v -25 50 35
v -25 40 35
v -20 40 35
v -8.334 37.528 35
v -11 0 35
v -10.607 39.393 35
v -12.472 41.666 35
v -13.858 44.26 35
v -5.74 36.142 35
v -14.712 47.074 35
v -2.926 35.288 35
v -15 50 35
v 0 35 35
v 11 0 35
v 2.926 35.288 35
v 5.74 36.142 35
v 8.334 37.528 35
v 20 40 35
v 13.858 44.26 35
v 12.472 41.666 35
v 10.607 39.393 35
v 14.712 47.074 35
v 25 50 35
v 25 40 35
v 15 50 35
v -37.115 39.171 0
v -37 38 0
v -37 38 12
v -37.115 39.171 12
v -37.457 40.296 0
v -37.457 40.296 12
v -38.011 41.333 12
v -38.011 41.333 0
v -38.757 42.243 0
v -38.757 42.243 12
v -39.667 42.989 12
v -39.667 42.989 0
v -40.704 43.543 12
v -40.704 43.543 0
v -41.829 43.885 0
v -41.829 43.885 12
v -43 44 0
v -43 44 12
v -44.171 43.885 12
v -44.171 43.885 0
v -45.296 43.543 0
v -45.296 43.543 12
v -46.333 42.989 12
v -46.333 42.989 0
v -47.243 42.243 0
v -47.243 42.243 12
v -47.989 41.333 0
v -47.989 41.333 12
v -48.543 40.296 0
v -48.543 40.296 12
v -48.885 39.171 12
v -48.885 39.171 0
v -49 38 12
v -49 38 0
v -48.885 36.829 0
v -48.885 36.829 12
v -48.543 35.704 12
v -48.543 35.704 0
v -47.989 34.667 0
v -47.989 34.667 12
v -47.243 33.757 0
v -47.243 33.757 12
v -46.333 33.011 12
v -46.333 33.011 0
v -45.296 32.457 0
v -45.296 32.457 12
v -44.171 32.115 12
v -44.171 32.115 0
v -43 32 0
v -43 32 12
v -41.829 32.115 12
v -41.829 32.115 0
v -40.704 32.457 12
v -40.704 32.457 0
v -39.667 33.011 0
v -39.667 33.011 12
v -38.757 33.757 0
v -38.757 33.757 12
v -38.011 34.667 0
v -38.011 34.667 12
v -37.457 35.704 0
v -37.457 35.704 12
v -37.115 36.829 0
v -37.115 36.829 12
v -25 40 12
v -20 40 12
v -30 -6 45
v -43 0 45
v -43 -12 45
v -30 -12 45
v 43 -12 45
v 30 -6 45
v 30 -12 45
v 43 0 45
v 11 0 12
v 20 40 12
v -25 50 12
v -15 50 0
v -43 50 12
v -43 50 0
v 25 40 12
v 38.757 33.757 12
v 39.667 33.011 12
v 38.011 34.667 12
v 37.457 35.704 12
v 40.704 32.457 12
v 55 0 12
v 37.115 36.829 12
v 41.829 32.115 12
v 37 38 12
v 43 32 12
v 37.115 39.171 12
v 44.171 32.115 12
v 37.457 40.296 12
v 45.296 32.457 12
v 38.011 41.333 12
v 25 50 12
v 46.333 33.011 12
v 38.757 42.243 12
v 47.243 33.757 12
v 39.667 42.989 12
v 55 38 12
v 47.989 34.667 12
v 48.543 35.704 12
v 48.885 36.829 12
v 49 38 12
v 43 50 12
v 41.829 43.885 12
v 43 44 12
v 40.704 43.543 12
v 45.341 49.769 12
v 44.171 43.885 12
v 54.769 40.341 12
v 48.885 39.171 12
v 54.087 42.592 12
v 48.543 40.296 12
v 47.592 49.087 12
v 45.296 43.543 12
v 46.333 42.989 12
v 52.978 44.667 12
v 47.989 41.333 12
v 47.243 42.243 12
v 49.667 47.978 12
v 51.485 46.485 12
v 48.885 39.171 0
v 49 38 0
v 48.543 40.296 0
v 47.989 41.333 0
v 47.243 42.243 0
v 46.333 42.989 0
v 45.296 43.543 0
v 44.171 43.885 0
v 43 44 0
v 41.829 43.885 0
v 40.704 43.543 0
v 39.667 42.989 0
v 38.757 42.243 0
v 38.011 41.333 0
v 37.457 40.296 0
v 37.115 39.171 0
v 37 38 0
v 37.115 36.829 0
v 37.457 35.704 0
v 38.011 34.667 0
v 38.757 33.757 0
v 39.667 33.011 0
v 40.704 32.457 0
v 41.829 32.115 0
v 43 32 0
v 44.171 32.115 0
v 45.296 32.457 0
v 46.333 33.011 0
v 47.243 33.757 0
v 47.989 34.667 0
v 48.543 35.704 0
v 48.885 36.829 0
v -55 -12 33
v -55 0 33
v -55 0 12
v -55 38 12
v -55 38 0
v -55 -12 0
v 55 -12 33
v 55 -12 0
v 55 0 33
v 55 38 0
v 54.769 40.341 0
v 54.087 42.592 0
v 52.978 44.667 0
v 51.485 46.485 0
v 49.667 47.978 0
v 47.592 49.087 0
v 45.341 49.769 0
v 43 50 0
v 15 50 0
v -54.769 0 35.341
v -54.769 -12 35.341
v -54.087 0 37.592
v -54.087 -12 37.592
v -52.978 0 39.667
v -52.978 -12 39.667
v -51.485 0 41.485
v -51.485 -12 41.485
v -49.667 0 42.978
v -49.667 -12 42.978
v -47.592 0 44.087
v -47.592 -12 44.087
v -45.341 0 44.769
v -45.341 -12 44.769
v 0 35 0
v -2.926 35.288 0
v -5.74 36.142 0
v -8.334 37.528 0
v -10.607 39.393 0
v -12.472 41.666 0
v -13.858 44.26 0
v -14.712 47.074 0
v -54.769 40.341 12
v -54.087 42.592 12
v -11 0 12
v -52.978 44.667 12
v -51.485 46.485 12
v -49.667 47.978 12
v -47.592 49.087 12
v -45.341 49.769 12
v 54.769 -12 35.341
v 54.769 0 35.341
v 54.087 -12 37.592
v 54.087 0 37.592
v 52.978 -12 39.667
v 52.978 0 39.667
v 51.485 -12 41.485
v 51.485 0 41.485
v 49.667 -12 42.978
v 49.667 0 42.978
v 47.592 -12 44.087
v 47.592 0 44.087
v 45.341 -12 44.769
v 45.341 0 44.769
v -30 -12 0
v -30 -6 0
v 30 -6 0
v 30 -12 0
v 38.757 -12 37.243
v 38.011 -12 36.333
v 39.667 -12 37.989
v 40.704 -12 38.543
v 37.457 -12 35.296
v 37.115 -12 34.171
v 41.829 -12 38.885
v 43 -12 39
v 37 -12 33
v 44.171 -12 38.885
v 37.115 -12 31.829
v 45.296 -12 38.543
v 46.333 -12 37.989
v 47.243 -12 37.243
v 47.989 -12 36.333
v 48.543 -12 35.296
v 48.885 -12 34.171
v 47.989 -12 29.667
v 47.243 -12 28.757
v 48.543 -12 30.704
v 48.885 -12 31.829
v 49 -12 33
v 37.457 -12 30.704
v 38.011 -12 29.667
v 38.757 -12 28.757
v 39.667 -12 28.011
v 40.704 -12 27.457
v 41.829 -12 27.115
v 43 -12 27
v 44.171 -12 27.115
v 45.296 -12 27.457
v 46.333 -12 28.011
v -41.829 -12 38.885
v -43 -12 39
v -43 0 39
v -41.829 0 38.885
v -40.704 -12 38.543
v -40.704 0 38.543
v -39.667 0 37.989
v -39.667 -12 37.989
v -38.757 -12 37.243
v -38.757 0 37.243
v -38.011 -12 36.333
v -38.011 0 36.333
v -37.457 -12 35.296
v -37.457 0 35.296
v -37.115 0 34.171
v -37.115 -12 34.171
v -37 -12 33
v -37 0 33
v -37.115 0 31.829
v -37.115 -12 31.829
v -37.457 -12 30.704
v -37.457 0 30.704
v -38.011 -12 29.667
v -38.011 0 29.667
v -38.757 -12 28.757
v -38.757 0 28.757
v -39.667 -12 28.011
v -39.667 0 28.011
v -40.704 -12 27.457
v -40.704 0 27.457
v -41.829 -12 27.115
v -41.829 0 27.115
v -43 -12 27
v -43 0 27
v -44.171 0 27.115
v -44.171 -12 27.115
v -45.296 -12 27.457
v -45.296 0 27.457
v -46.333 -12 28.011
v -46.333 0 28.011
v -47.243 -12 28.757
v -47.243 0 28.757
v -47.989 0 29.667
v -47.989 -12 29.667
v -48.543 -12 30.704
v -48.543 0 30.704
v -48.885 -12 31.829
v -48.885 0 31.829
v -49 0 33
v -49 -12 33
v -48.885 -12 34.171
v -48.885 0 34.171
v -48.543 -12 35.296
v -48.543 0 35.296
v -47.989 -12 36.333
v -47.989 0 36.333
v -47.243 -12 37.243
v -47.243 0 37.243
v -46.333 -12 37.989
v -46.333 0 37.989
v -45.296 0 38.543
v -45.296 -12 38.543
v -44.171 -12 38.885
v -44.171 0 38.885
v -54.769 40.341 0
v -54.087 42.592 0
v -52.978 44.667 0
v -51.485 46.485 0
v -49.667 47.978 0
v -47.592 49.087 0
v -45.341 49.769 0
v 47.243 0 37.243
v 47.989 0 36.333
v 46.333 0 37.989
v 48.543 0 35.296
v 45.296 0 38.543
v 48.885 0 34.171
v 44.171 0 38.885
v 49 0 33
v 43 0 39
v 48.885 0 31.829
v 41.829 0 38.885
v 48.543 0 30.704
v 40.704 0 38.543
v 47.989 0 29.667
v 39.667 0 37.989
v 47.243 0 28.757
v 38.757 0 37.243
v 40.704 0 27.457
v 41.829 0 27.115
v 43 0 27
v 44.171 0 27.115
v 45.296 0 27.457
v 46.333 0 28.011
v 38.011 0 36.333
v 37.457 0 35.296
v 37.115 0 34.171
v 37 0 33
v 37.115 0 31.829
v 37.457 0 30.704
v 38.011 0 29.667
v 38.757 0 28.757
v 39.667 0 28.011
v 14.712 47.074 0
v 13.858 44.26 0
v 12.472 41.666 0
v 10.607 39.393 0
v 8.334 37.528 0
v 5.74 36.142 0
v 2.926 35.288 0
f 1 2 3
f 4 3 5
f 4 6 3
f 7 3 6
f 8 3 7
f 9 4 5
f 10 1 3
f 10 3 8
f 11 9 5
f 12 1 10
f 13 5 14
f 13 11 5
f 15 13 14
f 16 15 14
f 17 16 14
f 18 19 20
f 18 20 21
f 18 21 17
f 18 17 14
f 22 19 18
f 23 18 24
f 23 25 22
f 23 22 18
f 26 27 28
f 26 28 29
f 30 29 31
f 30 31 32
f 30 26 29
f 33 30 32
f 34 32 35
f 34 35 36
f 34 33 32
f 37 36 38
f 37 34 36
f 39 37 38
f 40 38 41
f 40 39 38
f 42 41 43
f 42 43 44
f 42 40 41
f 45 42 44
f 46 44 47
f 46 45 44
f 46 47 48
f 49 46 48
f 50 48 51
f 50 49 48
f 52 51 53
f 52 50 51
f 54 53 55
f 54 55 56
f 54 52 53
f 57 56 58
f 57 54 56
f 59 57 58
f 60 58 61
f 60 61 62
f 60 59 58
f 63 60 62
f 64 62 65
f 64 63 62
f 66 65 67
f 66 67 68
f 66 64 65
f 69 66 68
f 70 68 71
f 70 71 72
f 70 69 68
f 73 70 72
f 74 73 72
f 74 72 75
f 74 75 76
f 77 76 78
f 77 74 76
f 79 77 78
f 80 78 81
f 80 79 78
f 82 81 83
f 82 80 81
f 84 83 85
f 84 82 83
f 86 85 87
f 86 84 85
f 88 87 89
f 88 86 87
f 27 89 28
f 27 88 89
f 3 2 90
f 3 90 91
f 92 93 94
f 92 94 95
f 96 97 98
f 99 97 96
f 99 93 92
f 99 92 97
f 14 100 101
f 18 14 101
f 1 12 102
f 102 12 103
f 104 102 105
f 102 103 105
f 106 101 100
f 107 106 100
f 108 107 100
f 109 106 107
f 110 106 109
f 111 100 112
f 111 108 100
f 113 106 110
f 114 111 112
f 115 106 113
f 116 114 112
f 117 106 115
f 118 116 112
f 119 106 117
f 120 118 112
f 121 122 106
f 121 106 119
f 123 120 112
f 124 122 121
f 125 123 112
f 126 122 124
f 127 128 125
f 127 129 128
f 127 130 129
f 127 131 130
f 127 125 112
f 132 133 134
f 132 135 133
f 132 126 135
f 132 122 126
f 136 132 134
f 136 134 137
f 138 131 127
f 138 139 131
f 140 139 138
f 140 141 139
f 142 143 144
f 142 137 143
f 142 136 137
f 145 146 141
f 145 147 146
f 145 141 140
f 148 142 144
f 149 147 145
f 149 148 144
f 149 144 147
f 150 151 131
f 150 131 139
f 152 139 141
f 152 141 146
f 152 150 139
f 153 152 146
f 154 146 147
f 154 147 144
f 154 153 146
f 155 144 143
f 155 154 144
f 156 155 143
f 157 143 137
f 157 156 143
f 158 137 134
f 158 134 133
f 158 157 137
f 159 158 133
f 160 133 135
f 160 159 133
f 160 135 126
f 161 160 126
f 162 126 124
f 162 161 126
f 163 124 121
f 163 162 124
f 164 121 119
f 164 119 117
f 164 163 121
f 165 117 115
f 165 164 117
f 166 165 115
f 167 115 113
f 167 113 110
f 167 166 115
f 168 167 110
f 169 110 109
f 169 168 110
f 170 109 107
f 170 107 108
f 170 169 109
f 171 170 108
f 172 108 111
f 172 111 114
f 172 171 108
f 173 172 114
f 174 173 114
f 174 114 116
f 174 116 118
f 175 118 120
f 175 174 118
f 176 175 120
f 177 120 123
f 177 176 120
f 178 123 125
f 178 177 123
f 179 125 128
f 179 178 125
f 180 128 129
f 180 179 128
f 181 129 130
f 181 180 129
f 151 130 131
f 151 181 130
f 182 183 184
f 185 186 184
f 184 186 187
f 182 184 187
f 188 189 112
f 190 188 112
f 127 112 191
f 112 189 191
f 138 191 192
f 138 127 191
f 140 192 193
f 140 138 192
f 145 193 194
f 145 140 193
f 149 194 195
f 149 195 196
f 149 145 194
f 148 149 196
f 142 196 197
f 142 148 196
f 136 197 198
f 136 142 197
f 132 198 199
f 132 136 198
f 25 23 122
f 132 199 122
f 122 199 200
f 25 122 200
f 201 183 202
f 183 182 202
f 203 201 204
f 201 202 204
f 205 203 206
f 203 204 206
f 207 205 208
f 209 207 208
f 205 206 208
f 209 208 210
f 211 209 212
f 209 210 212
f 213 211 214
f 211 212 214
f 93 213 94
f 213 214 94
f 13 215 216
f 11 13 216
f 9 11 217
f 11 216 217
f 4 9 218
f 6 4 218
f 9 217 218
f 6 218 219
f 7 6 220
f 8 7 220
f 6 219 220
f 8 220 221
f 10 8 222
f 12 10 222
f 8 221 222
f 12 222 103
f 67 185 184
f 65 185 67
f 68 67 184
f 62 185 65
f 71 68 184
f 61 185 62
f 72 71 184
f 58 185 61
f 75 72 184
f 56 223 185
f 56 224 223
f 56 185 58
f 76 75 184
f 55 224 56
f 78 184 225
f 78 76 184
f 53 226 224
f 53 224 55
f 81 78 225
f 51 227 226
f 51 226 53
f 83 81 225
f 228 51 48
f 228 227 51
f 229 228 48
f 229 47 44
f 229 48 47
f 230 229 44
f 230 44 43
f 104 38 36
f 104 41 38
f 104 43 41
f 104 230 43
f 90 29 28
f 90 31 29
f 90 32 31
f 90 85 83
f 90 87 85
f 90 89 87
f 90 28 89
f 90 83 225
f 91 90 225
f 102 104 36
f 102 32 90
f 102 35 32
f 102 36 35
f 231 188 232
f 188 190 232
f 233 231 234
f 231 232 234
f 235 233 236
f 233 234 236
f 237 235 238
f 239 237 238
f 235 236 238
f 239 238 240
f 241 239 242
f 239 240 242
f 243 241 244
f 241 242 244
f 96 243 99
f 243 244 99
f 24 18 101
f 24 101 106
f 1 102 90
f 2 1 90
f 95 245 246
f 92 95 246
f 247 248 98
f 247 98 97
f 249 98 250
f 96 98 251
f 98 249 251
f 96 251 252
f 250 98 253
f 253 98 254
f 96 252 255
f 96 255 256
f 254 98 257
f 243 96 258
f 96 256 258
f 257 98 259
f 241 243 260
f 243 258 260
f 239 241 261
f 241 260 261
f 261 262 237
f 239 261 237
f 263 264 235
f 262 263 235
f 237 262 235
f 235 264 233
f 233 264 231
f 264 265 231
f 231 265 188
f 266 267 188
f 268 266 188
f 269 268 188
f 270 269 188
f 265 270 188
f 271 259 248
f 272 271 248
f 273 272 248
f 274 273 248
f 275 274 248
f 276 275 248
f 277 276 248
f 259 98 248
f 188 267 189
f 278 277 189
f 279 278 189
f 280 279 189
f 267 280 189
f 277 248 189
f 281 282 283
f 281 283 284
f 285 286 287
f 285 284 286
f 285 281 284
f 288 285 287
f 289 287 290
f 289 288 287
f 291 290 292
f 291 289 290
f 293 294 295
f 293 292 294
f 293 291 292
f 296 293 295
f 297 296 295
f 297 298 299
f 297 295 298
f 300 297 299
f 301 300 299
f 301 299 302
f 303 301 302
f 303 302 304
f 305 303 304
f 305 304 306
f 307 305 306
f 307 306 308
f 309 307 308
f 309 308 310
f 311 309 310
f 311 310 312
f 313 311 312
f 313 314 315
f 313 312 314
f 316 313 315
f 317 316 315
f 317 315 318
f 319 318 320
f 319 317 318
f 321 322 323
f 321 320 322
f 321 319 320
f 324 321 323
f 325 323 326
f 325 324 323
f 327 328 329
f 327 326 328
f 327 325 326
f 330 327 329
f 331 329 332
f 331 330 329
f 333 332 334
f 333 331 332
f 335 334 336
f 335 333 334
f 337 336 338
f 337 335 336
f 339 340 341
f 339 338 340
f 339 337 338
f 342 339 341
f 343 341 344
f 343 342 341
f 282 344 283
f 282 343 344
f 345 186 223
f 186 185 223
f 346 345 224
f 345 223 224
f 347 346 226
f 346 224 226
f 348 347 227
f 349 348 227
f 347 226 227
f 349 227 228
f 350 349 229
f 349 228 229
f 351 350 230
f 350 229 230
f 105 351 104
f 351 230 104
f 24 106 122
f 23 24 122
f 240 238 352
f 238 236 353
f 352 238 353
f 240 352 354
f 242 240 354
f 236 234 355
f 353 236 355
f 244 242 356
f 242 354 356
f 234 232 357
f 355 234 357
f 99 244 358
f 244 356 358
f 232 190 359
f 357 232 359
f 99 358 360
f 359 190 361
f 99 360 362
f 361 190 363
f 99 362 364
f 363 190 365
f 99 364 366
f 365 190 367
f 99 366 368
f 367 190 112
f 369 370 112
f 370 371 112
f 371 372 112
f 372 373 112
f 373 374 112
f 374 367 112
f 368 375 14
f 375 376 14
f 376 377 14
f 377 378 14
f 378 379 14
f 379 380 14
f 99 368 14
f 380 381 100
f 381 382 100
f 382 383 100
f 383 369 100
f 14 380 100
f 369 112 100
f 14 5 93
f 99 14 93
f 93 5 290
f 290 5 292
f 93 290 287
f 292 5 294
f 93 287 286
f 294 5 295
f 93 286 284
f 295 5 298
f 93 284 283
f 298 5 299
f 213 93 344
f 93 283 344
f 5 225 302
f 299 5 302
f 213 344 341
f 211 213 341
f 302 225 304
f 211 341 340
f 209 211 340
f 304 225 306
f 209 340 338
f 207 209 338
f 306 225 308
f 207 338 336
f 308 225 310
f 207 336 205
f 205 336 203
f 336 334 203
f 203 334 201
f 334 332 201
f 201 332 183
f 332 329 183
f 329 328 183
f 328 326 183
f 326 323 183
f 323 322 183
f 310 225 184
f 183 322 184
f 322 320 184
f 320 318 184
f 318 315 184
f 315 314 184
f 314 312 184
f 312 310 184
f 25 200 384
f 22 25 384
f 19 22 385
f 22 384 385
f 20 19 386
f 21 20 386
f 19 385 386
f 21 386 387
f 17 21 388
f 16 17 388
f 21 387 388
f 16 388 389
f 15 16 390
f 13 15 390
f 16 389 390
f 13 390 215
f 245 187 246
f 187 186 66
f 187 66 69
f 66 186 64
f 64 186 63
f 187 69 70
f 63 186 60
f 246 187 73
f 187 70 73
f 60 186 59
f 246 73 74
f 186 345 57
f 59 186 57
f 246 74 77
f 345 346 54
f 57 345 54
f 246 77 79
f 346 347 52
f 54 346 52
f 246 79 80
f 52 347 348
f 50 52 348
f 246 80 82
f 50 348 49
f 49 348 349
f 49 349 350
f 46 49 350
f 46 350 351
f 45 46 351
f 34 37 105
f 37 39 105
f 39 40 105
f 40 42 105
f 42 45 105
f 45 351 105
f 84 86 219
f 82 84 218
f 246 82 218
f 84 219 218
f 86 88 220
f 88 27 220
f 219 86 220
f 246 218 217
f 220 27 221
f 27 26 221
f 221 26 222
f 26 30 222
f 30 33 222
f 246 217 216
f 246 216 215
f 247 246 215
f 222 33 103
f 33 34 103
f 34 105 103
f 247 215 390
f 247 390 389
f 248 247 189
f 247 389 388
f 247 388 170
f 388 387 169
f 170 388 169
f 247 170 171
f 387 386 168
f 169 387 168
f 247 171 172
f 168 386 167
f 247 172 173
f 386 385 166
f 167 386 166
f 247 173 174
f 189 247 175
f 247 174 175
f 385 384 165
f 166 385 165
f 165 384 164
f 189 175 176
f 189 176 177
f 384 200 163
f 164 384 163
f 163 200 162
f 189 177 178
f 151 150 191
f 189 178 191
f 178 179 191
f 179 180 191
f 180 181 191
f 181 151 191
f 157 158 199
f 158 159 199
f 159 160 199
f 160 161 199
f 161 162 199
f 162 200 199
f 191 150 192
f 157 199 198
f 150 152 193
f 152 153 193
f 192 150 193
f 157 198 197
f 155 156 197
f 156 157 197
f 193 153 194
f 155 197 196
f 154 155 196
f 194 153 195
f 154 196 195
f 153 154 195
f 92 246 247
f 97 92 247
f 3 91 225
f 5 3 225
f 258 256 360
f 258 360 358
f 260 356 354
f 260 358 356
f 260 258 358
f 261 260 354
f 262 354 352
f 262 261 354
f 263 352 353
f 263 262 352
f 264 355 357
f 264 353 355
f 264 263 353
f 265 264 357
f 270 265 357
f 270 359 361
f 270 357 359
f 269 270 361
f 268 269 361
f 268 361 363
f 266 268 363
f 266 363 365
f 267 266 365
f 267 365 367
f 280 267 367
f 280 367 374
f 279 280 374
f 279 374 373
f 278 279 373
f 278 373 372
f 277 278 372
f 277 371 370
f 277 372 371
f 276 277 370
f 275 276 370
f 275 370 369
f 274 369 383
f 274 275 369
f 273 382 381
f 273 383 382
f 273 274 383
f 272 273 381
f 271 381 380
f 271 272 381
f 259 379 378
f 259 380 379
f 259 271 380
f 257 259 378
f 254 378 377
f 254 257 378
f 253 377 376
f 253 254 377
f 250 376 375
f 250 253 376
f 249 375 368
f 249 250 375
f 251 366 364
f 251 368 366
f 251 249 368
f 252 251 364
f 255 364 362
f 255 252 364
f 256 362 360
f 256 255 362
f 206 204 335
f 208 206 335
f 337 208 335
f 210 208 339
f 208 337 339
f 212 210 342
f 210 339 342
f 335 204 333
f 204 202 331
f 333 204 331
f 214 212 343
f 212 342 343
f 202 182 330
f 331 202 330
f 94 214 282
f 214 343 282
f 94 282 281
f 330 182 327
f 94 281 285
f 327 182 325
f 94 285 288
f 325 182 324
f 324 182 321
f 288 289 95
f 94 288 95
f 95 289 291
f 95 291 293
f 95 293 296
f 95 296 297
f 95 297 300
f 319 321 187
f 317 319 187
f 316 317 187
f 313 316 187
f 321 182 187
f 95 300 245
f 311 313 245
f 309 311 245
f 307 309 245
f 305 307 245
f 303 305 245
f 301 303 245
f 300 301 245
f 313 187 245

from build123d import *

# Parameters (mm, degrees)
BOSS_EXTRUDE2_DEPTH     = 45
BOSS_EXTRUDE3_DEPTH     = 35
SKETCH2_5_R             = 6
BOSS_EXTRUDE4_DEPTH     = 12
FILLET1_R               = 12
CUT_EXTRUDE1_DEPTH      = 87.890735985
CUT_EXTRUDE1_DEPTH_BACK = 87.890735985
SKETCH3_R               = 6


with BuildPart() as part:
    # Sketch2 → Boss-Extrude2 (new body)
    with BuildSketch(Plane.XY):
        Polygon((55, 0), (-55, 0), (-55, -12), (-30, -12), (-30, -6), (30, -6), (30, -12), (55, -12), align=None)
    extrude(amount=BOSS_EXTRUDE2_DEPTH)

    # Sketch2<4> → Boss-Extrude3 (add)
    with BuildSketch(Plane.XY):
        with BuildLine():
            Line((11, 0), (20, 40))
            Line((20, 40), (25, 40))
            Line((25, 40), (25, 50))
            Line((25, 50), (15, 50))
            ThreePointArc((15, 50), (0, 35), (-15, 50))
            Line((-15, 50), (-25, 50))
            Line((-25, 50), (-25, 40))
            Line((-25, 40), (-20, 40))
            Line((-20, 40), (-11, 0))
            Line((-11, 0), (11, 0))
        make_face()
    extrude(amount=BOSS_EXTRUDE3_DEPTH)

    # Sketch2<5> → Boss-Extrude4 (add)
    # profile 1 of 2: a face of its own
    with BuildSketch(Plane.XY):
        Polygon((11, 0), (55, 0), (55, 50), (25, 50), (25, 40), (20, 40), align=None)
        with Locations((43, 38)):
            Circle(SKETCH2_5_R, mode=Mode.SUBTRACT)
    # profile 2 of 2: a face of its own
    with BuildSketch(Plane.XY):
        Polygon((-55, 0), (-11, 0), (-20, 40), (-25, 40), (-25, 50), (-55, 50), align=None)
        with Locations((-43, 38)):
            Circle(SKETCH2_5_R, mode=Mode.SUBTRACT)
    extrude(amount=BOSS_EXTRUDE4_DEPTH)

    # Fillet1
    fillet1_edges = [part.edges().sort_by_distance(p)[0] for p in [
        (55, -6, 45),
        (-55, -6, 45),
        (-55, 50, 6),
        (55, 50, 6),
    ]]
    fillet(fillet1_edges, radius=FILLET1_R)

    # Sketch3 → Cut-Extrude1 (cut, two sides: drawn at the far end of the back side and taken through both)
    with BuildSketch(Plane(origin=(0, 0, 0), x_dir=(1, 0, 0), z_dir=(0, 1, 0)).offset(-CUT_EXTRUDE1_DEPTH_BACK)):
        with Locations((-43, -33)):
            Circle(SKETCH3_R)
        with Locations((43, -33)):
            Circle(SKETCH3_R)
    extrude(amount=CUT_EXTRUDE1_DEPTH + CUT_EXTRUDE1_DEPTH_BACK, mode=Mode.SUBTRACT)


solid = part.part
